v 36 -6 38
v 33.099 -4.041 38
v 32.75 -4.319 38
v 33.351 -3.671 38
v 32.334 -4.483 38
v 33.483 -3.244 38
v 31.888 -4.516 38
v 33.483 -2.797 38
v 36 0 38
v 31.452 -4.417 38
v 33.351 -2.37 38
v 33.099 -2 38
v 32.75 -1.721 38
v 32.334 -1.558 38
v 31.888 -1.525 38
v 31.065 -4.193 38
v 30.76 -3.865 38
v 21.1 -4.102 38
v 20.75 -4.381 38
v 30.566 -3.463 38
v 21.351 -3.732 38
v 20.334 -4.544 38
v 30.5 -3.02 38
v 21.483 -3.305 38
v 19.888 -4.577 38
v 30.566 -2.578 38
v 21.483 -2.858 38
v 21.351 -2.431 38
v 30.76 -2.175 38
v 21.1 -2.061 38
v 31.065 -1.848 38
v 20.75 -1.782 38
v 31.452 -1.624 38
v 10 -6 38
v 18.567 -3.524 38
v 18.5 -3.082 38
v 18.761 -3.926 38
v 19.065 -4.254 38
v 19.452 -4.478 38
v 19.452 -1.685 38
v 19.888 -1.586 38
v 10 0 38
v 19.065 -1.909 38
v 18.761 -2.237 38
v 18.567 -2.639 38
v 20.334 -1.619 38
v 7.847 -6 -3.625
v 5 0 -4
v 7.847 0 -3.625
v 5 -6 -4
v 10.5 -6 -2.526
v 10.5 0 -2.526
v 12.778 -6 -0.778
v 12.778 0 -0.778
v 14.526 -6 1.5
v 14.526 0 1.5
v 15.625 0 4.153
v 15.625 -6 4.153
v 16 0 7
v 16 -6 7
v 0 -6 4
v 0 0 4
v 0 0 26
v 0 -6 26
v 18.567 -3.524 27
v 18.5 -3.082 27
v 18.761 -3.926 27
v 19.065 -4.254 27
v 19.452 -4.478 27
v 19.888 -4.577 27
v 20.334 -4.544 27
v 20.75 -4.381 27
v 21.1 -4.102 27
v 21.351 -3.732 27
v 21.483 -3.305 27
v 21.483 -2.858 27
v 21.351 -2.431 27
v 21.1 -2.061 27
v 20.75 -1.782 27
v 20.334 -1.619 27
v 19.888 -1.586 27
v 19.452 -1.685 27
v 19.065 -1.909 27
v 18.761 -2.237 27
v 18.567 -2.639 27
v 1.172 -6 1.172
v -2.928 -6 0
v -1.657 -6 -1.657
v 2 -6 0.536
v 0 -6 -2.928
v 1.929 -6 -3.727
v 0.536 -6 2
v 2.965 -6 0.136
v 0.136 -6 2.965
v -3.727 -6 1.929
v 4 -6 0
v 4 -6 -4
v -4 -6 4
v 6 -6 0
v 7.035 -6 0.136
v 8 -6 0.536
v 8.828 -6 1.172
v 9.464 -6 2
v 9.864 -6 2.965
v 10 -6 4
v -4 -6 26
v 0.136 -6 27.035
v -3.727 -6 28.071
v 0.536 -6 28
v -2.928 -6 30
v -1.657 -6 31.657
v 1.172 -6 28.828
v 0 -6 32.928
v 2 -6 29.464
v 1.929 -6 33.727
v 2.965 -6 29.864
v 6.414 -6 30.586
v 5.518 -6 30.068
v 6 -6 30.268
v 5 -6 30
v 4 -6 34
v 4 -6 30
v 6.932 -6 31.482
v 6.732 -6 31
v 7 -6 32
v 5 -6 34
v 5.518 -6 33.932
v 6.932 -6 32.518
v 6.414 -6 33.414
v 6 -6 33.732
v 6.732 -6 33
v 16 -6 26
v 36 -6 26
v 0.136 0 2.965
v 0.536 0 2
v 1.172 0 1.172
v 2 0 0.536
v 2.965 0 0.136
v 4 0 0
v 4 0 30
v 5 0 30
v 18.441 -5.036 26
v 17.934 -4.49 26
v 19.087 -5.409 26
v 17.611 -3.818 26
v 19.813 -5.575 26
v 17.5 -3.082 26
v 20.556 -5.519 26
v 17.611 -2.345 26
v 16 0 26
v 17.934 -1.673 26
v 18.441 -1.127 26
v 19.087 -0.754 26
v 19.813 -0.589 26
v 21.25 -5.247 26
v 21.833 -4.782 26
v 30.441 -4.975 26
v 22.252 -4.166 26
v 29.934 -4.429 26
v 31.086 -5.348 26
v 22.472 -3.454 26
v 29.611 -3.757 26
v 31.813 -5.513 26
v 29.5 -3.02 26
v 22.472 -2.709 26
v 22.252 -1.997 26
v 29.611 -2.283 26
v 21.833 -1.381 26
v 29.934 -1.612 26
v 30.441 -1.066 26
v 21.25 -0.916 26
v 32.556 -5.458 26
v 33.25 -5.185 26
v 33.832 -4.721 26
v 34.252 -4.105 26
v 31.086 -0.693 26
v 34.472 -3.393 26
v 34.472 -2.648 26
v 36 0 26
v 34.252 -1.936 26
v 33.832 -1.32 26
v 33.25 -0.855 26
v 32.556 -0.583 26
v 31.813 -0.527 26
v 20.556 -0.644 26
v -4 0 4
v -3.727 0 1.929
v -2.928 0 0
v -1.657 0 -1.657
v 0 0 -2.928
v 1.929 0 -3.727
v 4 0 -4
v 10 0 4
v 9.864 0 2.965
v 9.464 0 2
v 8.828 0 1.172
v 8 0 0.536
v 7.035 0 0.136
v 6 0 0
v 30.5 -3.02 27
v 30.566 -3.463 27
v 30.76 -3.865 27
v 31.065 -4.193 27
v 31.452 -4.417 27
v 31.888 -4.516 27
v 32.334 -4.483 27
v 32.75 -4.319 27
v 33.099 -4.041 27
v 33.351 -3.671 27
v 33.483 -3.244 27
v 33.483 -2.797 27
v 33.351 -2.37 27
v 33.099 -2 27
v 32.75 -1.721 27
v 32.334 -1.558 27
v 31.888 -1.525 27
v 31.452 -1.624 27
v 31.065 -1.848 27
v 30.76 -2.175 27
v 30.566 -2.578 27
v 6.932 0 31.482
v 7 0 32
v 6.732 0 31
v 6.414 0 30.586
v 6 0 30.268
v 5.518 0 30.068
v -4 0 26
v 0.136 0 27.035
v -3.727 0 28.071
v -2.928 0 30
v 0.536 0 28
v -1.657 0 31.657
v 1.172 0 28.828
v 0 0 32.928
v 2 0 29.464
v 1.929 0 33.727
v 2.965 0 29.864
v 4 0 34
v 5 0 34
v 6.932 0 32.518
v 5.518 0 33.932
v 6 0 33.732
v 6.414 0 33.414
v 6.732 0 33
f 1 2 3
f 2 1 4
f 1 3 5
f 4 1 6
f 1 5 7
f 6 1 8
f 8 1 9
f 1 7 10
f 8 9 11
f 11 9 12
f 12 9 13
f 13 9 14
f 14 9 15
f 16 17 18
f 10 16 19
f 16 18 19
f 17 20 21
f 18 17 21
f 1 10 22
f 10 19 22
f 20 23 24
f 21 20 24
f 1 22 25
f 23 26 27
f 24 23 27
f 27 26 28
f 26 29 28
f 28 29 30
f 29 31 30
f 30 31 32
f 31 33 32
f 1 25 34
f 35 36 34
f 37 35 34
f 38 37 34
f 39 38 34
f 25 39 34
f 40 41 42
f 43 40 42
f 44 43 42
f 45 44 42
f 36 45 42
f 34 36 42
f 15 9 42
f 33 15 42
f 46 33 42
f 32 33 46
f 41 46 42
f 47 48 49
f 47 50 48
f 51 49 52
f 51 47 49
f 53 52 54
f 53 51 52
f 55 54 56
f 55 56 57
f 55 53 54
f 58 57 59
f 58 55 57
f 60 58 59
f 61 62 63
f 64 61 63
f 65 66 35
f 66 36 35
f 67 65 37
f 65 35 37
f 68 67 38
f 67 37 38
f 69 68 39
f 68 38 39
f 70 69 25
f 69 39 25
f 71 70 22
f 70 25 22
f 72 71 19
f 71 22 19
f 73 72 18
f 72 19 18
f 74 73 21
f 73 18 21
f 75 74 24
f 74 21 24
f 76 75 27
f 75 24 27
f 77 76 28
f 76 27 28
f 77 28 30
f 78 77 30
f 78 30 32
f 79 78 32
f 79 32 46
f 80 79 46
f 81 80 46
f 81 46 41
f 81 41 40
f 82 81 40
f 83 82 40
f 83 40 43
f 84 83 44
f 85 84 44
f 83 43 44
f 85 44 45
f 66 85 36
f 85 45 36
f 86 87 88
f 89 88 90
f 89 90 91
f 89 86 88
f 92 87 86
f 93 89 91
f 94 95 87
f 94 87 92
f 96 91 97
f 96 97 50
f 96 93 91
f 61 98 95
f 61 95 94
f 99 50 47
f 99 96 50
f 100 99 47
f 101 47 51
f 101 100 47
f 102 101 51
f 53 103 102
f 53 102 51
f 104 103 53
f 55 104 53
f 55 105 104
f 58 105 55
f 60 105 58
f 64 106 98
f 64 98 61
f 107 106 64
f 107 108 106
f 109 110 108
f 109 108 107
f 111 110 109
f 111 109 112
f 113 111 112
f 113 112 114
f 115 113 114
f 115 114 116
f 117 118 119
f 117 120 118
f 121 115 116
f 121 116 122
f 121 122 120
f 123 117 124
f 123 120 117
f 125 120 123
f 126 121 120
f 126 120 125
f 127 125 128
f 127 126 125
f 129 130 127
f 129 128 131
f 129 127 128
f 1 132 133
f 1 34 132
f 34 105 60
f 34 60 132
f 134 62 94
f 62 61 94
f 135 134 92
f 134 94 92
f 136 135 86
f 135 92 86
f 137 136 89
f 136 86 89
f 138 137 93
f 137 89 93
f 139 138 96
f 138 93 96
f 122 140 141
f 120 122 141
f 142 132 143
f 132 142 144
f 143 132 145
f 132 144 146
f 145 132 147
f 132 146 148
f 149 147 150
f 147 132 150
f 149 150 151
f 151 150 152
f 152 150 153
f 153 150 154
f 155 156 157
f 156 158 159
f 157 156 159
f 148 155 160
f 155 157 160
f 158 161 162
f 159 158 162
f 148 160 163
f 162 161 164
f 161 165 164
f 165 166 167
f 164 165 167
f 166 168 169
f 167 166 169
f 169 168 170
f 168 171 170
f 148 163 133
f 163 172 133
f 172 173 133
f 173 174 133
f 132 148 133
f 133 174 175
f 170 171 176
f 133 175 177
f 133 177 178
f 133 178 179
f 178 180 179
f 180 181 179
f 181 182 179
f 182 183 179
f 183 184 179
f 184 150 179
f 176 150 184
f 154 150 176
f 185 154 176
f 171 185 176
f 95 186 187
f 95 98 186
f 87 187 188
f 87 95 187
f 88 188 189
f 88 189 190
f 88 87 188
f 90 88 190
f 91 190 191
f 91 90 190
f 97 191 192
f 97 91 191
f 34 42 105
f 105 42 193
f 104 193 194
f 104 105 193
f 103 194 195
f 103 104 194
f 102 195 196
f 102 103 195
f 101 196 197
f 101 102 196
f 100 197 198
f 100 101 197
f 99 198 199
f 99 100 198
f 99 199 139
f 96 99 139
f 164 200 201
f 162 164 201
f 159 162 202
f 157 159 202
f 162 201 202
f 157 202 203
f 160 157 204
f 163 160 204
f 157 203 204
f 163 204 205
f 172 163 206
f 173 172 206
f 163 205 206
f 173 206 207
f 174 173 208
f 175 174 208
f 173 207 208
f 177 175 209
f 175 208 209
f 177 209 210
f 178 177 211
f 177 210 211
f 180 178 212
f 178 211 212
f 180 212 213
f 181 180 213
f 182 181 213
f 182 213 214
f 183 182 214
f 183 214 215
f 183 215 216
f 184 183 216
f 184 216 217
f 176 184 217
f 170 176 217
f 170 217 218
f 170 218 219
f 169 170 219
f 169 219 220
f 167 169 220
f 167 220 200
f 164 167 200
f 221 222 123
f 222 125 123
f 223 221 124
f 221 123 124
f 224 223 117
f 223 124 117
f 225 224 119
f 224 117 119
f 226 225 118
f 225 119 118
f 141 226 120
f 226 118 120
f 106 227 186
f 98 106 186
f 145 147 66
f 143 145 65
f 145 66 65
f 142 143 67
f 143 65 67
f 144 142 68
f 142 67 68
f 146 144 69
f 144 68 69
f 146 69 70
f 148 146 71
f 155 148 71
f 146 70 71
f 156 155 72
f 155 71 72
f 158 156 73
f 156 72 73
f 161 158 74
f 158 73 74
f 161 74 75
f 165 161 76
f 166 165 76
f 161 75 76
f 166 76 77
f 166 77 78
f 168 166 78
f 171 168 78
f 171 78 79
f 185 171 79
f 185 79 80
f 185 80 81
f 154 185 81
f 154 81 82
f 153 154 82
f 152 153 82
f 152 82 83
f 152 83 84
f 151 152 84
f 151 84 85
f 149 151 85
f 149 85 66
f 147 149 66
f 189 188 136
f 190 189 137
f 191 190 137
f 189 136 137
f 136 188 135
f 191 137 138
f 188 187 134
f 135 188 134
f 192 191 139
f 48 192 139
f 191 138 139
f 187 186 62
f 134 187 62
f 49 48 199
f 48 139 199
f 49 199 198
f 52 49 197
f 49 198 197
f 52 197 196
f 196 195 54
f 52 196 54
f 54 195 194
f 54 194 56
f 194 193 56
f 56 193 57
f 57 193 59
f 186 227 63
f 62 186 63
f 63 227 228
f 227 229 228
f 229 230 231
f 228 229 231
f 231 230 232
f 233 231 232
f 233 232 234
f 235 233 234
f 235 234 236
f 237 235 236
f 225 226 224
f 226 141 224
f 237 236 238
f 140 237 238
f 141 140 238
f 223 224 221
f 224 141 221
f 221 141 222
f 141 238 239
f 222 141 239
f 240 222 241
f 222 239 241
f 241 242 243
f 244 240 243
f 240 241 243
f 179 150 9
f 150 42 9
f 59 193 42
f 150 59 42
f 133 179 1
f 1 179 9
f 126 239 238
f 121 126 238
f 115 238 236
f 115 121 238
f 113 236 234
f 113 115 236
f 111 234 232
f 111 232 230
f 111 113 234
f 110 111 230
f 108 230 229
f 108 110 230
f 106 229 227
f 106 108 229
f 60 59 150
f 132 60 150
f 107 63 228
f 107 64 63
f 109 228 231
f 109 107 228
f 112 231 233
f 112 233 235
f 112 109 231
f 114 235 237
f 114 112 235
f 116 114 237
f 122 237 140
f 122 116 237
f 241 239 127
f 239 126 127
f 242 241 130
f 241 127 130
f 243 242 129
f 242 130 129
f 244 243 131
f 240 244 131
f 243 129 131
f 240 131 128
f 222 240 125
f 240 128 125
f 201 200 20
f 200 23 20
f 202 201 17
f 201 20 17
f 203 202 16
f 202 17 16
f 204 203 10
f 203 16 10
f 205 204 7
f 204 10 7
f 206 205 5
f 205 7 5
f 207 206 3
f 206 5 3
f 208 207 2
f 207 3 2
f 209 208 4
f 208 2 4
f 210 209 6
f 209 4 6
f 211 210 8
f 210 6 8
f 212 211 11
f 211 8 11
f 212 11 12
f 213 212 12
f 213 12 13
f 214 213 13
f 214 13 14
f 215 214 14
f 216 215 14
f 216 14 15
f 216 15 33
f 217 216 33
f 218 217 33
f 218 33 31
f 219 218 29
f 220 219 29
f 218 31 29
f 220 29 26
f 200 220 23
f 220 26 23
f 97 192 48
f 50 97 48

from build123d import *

# Parameters (mm, degrees)
F1_DEPTH       = 6
F2_R           = 4
F3_R           = 8
F4_R           = 11
F5_R           = 1.99999
F7_D           = 3
F7_CSINK_D     = 5
F7_CSINK_ANGLE = 90


# Not quite as in the source:
# - a fillet or chamfer is up to 0.001 mm smaller than in the source, because OpenCascade refuses the exact size


with BuildPart() as f1:
    # F0 (on Front) → F1 (new body)
    with BuildSketch(Plane.XZ):
        Polygon((0, 0), (0, 30), (7, 30), (7, 34), (-4, 34), (-4, -4), (16, -4), (16, 26), (36, 26), (36, 38), (10, 38), (10, 0), align=None)
    extrude(amount=F1_DEPTH)

    # F2
    f2_edges = [f1.edges().sort_by_distance(p)[0] for p in [
        (10, -3, 0),
        (0, -3, 0),
        (0, -3, 30),
    ]]
    fillet(f2_edges, radius=F2_R)

    # F3
    f3_edges = [f1.edges().sort_by_distance(p)[0] for p in [
        (-4, -3, 34),
        (-4, -3, -4),
    ]]
    fillet(f3_edges, radius=F3_R)

    # F4
    f4_edges = [f1.edges().sort_by_distance(p)[0] for p in [
        (16, -3, -4),
    ]]
    fillet(f4_edges, radius=F4_R)

    # F5 (radius 2 in the source; OpenCascade refuses exactly that, so slightly less here)
    f5_edges = [f1.edges().sort_by_distance(p)[0] for p in [
        (7, -3, 34),
        (7, -3, 30),
    ]]
    fillet(f5_edges, radius=F5_R)

    # F7 (through all)
    with Locations(Plane(origin=(0, 0, 26), x_dir=(1, 0, 0), z_dir=(0, 0, -1))):
        with Locations((20, 3.0815127769), (31.9998442765, 3.0203789876)):
            CounterSinkHole(F7_D / 2, F7_CSINK_D / 2, counter_sink_angle=F7_CSINK_ANGLE)


solid = f1.part
